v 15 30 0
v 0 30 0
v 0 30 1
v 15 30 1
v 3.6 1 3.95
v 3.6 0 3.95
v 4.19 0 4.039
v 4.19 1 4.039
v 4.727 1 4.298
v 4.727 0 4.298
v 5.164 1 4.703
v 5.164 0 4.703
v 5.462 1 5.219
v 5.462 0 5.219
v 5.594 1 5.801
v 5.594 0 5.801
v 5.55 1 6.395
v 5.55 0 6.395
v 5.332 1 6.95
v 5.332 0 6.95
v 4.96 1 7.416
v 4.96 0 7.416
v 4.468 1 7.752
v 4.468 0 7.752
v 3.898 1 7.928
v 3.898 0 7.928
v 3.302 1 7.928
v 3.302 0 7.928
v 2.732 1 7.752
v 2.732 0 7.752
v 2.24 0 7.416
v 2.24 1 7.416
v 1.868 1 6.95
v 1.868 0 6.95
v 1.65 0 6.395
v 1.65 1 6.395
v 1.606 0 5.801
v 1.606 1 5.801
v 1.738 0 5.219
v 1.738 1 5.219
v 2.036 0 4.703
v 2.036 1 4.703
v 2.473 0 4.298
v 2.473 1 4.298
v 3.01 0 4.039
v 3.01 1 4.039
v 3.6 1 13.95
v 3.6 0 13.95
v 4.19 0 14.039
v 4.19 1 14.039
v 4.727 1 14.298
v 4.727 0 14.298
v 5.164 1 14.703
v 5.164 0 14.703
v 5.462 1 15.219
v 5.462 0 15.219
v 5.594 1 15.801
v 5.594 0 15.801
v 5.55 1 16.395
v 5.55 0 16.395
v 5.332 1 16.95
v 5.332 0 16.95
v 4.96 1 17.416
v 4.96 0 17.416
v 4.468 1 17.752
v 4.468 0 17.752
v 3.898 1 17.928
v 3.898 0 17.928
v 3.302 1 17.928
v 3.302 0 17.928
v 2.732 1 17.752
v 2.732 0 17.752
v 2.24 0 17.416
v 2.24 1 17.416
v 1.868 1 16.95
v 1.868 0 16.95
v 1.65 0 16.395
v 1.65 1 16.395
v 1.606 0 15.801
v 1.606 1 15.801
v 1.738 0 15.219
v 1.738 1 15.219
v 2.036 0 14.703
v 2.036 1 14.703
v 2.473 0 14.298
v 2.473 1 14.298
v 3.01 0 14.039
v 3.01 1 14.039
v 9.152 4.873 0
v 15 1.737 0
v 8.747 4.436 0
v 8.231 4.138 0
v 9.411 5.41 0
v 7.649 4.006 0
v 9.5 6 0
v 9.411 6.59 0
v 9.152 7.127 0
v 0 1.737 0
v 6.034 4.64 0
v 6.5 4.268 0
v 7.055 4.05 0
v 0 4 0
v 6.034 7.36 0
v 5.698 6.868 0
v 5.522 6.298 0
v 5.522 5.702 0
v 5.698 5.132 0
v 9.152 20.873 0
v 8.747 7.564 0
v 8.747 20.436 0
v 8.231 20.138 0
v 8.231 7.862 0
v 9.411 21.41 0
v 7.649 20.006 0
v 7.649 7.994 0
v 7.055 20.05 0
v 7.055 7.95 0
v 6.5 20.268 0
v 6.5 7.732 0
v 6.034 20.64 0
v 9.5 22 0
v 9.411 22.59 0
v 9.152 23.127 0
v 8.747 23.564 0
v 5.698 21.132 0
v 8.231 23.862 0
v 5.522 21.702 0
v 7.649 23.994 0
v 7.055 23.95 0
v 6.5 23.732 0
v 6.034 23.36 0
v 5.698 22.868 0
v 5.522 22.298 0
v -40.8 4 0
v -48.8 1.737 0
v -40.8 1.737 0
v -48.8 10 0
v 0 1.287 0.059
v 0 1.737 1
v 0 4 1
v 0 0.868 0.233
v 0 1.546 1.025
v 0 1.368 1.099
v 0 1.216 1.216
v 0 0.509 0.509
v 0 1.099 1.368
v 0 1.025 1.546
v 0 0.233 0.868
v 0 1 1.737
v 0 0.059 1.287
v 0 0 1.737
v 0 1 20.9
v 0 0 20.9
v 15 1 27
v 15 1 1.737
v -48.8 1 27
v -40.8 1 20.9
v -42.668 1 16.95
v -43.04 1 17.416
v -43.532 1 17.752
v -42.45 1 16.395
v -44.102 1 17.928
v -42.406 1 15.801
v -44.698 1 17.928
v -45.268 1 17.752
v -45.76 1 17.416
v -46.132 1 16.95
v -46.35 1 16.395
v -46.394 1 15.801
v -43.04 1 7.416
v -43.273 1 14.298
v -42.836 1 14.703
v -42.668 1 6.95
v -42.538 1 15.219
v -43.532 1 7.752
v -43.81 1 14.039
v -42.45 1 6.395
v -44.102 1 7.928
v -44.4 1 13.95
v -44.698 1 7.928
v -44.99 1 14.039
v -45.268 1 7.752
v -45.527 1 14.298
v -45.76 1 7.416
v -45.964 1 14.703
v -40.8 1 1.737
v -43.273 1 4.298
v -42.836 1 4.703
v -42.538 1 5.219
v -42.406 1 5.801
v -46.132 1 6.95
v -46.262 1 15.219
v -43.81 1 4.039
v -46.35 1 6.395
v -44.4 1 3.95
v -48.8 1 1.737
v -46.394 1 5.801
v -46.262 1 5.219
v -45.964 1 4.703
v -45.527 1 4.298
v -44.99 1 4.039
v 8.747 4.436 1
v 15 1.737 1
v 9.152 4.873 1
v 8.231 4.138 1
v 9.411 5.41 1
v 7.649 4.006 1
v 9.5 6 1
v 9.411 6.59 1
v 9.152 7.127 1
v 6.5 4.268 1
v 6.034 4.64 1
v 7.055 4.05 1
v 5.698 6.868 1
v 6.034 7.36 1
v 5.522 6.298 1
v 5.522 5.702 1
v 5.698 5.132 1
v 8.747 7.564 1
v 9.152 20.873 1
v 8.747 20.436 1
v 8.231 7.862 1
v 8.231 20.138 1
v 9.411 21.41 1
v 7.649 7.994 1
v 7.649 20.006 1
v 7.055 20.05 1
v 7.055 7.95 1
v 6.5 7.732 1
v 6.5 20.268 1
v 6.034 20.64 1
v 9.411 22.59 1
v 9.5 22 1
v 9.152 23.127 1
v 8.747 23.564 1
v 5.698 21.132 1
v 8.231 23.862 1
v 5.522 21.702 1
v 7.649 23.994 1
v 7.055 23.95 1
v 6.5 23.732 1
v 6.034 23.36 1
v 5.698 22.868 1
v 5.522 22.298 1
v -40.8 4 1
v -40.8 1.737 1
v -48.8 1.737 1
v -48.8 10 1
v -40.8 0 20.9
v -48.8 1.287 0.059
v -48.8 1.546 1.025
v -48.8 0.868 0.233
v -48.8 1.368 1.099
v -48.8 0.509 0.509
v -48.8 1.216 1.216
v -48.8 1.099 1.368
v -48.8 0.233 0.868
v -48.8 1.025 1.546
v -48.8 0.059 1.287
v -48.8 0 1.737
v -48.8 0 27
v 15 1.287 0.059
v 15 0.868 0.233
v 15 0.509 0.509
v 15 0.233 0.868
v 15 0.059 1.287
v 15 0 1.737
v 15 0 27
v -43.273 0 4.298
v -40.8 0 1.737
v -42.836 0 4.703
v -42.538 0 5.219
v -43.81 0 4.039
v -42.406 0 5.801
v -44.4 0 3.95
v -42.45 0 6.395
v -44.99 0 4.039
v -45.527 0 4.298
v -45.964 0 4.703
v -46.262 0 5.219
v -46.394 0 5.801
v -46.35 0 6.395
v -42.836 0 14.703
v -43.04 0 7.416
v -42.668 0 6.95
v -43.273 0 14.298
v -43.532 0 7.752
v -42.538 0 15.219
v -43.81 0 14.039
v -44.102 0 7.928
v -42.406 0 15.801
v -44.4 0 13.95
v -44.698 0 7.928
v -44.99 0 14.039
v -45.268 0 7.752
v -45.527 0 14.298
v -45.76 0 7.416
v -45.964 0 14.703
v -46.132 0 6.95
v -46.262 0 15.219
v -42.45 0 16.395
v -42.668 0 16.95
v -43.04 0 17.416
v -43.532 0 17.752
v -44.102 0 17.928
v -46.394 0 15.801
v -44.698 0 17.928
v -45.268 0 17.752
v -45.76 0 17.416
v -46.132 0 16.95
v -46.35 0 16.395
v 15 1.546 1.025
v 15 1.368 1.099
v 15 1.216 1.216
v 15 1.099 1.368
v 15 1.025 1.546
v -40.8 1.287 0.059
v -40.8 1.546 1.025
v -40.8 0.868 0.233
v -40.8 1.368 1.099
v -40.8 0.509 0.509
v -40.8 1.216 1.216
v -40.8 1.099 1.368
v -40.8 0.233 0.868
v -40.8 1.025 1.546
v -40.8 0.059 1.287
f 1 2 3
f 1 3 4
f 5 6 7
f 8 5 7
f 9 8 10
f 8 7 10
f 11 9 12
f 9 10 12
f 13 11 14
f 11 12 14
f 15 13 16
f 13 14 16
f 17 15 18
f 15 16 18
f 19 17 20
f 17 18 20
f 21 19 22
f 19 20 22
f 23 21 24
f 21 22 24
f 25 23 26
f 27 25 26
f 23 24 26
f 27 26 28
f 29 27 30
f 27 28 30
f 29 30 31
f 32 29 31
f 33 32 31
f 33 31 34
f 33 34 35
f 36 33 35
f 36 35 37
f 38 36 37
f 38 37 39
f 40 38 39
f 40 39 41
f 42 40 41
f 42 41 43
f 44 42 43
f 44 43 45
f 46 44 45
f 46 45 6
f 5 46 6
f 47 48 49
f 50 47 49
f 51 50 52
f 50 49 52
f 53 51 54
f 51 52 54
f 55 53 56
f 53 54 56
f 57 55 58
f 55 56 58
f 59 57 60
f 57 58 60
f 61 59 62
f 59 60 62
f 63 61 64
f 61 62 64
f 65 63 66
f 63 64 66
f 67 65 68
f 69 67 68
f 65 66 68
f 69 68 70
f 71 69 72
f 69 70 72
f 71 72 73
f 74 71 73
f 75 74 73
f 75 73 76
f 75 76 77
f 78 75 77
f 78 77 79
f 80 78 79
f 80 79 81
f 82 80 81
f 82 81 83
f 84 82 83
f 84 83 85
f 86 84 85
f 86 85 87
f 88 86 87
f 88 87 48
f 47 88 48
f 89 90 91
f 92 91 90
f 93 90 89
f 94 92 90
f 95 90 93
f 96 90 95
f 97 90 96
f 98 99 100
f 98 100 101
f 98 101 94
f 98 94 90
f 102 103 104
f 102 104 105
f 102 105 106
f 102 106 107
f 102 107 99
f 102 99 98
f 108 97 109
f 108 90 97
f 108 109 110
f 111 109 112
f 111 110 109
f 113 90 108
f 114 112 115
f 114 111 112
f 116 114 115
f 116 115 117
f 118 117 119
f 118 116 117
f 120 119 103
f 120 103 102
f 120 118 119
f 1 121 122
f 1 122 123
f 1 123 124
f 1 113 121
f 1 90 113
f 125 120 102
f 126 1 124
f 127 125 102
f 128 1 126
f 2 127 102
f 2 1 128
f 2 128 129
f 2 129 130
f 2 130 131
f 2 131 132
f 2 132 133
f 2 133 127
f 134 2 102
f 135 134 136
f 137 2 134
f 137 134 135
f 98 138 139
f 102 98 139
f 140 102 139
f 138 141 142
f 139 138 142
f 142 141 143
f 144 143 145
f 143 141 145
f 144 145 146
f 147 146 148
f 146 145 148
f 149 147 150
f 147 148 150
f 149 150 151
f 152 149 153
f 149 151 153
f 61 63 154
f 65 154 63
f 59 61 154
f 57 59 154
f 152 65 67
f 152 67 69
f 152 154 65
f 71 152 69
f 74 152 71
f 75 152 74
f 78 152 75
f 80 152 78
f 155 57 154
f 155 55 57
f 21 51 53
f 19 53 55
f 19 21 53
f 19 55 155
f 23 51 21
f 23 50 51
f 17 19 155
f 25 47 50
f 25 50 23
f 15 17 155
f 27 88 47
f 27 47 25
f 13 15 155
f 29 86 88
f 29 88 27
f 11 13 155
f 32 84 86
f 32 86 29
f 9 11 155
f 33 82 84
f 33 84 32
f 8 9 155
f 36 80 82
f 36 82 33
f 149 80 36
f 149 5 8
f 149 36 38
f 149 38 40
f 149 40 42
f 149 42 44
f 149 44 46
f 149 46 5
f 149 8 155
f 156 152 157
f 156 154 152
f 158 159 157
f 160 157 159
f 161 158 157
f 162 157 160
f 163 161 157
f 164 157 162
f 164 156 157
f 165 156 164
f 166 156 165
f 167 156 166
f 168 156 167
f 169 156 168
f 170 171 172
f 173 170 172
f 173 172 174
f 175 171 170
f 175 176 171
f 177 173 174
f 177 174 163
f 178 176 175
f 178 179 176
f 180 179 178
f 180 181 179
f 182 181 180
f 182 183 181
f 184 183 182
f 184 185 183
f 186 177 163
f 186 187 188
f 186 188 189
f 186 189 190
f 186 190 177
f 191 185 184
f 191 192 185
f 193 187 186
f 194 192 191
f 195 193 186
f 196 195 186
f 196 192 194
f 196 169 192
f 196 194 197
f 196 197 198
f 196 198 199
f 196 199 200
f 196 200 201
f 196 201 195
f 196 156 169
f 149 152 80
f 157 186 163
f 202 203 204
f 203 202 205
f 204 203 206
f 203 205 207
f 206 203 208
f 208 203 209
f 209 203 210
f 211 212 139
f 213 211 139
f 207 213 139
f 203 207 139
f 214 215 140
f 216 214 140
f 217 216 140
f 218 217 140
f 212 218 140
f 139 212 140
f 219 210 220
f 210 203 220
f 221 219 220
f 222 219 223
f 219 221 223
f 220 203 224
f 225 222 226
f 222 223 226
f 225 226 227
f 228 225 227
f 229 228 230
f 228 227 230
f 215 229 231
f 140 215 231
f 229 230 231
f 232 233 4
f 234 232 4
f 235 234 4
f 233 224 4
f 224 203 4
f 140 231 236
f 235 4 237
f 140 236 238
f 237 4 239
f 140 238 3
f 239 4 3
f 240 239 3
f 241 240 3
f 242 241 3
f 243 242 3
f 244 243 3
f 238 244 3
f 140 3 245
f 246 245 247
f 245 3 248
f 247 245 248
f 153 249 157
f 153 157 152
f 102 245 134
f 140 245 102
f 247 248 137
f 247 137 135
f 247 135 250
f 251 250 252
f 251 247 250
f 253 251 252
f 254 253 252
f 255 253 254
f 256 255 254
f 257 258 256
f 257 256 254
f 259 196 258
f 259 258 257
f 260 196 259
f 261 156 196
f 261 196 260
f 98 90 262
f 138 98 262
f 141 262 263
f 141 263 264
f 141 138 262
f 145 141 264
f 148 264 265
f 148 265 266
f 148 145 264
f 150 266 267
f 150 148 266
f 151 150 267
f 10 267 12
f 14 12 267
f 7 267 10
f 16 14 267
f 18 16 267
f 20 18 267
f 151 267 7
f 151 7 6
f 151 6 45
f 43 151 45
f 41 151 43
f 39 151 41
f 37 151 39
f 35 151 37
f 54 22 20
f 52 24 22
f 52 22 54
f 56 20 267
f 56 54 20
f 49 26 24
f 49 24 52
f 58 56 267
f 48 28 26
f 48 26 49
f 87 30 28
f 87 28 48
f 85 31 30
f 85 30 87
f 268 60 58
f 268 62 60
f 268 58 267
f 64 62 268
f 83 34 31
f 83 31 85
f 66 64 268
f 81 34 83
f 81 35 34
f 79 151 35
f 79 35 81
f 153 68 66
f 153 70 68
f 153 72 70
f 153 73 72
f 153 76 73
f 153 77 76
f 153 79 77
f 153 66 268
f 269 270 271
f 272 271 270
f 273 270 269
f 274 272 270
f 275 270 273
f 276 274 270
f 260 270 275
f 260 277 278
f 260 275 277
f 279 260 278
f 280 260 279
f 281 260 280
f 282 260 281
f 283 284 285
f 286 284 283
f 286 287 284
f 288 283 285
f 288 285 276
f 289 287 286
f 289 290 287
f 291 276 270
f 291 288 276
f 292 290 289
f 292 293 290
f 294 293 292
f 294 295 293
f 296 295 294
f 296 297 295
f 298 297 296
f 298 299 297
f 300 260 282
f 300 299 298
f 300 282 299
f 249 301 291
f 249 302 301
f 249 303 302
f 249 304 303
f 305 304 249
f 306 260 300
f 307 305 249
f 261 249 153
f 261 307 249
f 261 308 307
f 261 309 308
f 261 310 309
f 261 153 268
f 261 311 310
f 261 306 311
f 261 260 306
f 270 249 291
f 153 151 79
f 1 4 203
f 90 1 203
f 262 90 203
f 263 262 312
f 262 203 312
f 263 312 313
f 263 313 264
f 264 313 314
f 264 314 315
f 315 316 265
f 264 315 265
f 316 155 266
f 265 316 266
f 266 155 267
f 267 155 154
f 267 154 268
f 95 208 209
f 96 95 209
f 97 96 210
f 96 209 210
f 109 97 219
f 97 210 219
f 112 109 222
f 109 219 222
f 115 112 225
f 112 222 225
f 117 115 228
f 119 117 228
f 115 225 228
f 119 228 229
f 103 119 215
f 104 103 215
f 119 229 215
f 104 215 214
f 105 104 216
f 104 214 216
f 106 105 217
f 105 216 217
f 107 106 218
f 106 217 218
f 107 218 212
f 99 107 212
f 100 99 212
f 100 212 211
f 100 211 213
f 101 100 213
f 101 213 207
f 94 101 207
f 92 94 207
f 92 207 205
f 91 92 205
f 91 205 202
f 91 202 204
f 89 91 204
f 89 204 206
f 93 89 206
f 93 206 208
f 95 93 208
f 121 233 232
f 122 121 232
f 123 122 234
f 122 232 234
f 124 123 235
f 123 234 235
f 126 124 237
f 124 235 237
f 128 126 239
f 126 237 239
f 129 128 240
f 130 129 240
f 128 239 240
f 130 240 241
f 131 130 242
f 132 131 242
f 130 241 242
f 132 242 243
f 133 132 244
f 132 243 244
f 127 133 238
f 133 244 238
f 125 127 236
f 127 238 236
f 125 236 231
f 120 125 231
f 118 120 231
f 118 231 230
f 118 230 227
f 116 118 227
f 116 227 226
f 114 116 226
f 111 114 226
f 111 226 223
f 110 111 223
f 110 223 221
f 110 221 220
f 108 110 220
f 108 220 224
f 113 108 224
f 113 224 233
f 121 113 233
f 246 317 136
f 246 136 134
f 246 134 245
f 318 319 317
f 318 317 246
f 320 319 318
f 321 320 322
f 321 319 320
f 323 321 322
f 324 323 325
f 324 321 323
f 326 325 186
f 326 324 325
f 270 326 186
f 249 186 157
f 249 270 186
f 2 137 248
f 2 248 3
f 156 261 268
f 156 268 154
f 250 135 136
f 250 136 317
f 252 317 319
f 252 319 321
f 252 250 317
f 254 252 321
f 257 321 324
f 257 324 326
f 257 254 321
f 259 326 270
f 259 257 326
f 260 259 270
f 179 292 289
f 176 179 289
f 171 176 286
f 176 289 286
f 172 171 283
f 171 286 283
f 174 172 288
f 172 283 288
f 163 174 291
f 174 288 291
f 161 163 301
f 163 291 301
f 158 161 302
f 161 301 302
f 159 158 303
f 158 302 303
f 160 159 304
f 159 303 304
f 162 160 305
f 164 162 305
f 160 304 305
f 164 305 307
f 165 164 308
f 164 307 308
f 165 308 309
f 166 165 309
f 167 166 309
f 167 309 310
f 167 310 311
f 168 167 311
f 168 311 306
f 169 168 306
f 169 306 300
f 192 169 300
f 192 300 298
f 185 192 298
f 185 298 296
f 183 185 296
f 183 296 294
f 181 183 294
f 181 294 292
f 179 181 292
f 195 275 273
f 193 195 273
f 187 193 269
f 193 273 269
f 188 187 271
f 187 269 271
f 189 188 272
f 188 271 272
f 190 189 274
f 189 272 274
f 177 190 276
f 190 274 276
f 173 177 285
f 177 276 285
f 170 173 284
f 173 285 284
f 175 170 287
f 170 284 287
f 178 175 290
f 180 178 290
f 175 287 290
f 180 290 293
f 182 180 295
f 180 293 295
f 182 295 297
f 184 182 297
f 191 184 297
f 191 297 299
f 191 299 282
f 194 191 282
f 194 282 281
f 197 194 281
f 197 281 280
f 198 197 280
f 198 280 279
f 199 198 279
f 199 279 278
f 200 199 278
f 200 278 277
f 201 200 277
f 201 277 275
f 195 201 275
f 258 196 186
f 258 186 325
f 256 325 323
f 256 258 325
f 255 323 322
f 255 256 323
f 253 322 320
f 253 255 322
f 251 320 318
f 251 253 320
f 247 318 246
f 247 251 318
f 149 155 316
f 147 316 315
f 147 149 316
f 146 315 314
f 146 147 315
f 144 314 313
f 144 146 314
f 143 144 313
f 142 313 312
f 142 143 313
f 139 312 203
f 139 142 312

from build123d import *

# Parameters (mm, degrees)
T_LE_DE_BASE_PLI_E1_DEPTH             = 1
T_LE_PLI_E_SUR_AR_TE1_STRIP_W         = 5.4732
T_LE_PLI_E_SUR_AR_TE1_STRIP_H         = 1
T_LE_PLI_E_SUR_AR_TE1_STRIP_CUT_DEPTH = 63.8
T_LE_PLI_E_SUR_AR_TE1_DEPTH           = 63.8
ESQUISSE6_R                           = 2
ESQUISSE6_W                           = 40.8
ESQUISSE6_H                           = 20.9
ENL_V_MAT_EXTRU_1_DEPTH               = 4
ESQUISSE7_R                           = 2
ENL_V_MAT_EXTRU_2_DEPTH               = 63.908187067


# Sheet-metal steps are written as plain solids
with BuildPart() as part:
    # Esquisse1 → Tôle de base pliée1 (new body)
    with BuildSketch(Plane.XY):
        Polygon((-48.8, 10), (0, 30), (15, 30), (15, 0), (-48.8, 0), align=None)
    extrude(amount=T_LE_DE_BASE_PLI_E1_DEPTH)

    # Tôle pliée sur arête1 strip (across the edge) → Tôle pliée sur arête1 strip cut (cut)
    with BuildSketch(Plane(origin=(-48.8, 0, 1), x_dir=(0, 1, 0), z_dir=(1, 0, 0))):
        with Locations((-1, -0.5)):
            Rectangle(T_LE_PLI_E_SUR_AR_TE1_STRIP_W, T_LE_PLI_E_SUR_AR_TE1_STRIP_H)
    extrude(amount=T_LE_PLI_E_SUR_AR_TE1_STRIP_CUT_DEPTH, mode=Mode.SUBTRACT)

    # Tôle pliée sur arête1 section (across the edge) → Tôle pliée sur arête1 (add)
    with BuildSketch(Plane(origin=(-48.8, 0, 1), x_dir=(0, 1, 0), z_dir=(1, 0, 0))):
        with BuildLine():
            Line((0, 0.7366), (0, 26))
            Line((0, 26), (1, 26))
            Line((1, 26), (1, 0.7366))
            ThreePointArc((1, 0.7366), (1.215745145, 0.215745145), (1.7366, 0))
            Line((1.7366, 0), (1.7366, -1))
            ThreePointArc((1.7366, -1), (0.508638364, -0.491361636), (0, 0.7366))
        make_face()
    extrude(amount=T_LE_PLI_E_SUR_AR_TE1_DEPTH)

    # Esquisse6 → Enlèv. mat.-Extru.1 (cut)
    with BuildSketch(Plane.XZ):
        with Locations(Location((3.6, 15.95, 0), (0, 0, 270))):
            Circle(ESQUISSE6_R)
        with Locations(Location((3.6, 5.95, 0), (0, 0, 270))):
            Circle(ESQUISSE6_R)
        with Locations(Location((-44.4, 15.95, 0), (0, 0, 270))):
            Circle(ESQUISSE6_R)
        with Locations(Location((-44.4, 5.95, 0), (0, 0, 270))):
            Circle(ESQUISSE6_R)
        with Locations((-20.4, 10.45)):
            Rectangle(ESQUISSE6_W, ESQUISSE6_H)
    extrude(amount=-ENL_V_MAT_EXTRU_1_DEPTH, mode=Mode.SUBTRACT)

    # Esquisse7 → Enlèv. mat.-Extru.2 (cut, through all)
    with BuildSketch(Plane.XY.offset(1)):
        with Locations((7.5, 22)):
            Circle(ESQUISSE7_R)
        with Locations((7.5, 6)):
            Circle(ESQUISSE7_R)
    extrude(amount=-ENL_V_MAT_EXTRU_2_DEPTH, mode=Mode.SUBTRACT)


solid = part.part
